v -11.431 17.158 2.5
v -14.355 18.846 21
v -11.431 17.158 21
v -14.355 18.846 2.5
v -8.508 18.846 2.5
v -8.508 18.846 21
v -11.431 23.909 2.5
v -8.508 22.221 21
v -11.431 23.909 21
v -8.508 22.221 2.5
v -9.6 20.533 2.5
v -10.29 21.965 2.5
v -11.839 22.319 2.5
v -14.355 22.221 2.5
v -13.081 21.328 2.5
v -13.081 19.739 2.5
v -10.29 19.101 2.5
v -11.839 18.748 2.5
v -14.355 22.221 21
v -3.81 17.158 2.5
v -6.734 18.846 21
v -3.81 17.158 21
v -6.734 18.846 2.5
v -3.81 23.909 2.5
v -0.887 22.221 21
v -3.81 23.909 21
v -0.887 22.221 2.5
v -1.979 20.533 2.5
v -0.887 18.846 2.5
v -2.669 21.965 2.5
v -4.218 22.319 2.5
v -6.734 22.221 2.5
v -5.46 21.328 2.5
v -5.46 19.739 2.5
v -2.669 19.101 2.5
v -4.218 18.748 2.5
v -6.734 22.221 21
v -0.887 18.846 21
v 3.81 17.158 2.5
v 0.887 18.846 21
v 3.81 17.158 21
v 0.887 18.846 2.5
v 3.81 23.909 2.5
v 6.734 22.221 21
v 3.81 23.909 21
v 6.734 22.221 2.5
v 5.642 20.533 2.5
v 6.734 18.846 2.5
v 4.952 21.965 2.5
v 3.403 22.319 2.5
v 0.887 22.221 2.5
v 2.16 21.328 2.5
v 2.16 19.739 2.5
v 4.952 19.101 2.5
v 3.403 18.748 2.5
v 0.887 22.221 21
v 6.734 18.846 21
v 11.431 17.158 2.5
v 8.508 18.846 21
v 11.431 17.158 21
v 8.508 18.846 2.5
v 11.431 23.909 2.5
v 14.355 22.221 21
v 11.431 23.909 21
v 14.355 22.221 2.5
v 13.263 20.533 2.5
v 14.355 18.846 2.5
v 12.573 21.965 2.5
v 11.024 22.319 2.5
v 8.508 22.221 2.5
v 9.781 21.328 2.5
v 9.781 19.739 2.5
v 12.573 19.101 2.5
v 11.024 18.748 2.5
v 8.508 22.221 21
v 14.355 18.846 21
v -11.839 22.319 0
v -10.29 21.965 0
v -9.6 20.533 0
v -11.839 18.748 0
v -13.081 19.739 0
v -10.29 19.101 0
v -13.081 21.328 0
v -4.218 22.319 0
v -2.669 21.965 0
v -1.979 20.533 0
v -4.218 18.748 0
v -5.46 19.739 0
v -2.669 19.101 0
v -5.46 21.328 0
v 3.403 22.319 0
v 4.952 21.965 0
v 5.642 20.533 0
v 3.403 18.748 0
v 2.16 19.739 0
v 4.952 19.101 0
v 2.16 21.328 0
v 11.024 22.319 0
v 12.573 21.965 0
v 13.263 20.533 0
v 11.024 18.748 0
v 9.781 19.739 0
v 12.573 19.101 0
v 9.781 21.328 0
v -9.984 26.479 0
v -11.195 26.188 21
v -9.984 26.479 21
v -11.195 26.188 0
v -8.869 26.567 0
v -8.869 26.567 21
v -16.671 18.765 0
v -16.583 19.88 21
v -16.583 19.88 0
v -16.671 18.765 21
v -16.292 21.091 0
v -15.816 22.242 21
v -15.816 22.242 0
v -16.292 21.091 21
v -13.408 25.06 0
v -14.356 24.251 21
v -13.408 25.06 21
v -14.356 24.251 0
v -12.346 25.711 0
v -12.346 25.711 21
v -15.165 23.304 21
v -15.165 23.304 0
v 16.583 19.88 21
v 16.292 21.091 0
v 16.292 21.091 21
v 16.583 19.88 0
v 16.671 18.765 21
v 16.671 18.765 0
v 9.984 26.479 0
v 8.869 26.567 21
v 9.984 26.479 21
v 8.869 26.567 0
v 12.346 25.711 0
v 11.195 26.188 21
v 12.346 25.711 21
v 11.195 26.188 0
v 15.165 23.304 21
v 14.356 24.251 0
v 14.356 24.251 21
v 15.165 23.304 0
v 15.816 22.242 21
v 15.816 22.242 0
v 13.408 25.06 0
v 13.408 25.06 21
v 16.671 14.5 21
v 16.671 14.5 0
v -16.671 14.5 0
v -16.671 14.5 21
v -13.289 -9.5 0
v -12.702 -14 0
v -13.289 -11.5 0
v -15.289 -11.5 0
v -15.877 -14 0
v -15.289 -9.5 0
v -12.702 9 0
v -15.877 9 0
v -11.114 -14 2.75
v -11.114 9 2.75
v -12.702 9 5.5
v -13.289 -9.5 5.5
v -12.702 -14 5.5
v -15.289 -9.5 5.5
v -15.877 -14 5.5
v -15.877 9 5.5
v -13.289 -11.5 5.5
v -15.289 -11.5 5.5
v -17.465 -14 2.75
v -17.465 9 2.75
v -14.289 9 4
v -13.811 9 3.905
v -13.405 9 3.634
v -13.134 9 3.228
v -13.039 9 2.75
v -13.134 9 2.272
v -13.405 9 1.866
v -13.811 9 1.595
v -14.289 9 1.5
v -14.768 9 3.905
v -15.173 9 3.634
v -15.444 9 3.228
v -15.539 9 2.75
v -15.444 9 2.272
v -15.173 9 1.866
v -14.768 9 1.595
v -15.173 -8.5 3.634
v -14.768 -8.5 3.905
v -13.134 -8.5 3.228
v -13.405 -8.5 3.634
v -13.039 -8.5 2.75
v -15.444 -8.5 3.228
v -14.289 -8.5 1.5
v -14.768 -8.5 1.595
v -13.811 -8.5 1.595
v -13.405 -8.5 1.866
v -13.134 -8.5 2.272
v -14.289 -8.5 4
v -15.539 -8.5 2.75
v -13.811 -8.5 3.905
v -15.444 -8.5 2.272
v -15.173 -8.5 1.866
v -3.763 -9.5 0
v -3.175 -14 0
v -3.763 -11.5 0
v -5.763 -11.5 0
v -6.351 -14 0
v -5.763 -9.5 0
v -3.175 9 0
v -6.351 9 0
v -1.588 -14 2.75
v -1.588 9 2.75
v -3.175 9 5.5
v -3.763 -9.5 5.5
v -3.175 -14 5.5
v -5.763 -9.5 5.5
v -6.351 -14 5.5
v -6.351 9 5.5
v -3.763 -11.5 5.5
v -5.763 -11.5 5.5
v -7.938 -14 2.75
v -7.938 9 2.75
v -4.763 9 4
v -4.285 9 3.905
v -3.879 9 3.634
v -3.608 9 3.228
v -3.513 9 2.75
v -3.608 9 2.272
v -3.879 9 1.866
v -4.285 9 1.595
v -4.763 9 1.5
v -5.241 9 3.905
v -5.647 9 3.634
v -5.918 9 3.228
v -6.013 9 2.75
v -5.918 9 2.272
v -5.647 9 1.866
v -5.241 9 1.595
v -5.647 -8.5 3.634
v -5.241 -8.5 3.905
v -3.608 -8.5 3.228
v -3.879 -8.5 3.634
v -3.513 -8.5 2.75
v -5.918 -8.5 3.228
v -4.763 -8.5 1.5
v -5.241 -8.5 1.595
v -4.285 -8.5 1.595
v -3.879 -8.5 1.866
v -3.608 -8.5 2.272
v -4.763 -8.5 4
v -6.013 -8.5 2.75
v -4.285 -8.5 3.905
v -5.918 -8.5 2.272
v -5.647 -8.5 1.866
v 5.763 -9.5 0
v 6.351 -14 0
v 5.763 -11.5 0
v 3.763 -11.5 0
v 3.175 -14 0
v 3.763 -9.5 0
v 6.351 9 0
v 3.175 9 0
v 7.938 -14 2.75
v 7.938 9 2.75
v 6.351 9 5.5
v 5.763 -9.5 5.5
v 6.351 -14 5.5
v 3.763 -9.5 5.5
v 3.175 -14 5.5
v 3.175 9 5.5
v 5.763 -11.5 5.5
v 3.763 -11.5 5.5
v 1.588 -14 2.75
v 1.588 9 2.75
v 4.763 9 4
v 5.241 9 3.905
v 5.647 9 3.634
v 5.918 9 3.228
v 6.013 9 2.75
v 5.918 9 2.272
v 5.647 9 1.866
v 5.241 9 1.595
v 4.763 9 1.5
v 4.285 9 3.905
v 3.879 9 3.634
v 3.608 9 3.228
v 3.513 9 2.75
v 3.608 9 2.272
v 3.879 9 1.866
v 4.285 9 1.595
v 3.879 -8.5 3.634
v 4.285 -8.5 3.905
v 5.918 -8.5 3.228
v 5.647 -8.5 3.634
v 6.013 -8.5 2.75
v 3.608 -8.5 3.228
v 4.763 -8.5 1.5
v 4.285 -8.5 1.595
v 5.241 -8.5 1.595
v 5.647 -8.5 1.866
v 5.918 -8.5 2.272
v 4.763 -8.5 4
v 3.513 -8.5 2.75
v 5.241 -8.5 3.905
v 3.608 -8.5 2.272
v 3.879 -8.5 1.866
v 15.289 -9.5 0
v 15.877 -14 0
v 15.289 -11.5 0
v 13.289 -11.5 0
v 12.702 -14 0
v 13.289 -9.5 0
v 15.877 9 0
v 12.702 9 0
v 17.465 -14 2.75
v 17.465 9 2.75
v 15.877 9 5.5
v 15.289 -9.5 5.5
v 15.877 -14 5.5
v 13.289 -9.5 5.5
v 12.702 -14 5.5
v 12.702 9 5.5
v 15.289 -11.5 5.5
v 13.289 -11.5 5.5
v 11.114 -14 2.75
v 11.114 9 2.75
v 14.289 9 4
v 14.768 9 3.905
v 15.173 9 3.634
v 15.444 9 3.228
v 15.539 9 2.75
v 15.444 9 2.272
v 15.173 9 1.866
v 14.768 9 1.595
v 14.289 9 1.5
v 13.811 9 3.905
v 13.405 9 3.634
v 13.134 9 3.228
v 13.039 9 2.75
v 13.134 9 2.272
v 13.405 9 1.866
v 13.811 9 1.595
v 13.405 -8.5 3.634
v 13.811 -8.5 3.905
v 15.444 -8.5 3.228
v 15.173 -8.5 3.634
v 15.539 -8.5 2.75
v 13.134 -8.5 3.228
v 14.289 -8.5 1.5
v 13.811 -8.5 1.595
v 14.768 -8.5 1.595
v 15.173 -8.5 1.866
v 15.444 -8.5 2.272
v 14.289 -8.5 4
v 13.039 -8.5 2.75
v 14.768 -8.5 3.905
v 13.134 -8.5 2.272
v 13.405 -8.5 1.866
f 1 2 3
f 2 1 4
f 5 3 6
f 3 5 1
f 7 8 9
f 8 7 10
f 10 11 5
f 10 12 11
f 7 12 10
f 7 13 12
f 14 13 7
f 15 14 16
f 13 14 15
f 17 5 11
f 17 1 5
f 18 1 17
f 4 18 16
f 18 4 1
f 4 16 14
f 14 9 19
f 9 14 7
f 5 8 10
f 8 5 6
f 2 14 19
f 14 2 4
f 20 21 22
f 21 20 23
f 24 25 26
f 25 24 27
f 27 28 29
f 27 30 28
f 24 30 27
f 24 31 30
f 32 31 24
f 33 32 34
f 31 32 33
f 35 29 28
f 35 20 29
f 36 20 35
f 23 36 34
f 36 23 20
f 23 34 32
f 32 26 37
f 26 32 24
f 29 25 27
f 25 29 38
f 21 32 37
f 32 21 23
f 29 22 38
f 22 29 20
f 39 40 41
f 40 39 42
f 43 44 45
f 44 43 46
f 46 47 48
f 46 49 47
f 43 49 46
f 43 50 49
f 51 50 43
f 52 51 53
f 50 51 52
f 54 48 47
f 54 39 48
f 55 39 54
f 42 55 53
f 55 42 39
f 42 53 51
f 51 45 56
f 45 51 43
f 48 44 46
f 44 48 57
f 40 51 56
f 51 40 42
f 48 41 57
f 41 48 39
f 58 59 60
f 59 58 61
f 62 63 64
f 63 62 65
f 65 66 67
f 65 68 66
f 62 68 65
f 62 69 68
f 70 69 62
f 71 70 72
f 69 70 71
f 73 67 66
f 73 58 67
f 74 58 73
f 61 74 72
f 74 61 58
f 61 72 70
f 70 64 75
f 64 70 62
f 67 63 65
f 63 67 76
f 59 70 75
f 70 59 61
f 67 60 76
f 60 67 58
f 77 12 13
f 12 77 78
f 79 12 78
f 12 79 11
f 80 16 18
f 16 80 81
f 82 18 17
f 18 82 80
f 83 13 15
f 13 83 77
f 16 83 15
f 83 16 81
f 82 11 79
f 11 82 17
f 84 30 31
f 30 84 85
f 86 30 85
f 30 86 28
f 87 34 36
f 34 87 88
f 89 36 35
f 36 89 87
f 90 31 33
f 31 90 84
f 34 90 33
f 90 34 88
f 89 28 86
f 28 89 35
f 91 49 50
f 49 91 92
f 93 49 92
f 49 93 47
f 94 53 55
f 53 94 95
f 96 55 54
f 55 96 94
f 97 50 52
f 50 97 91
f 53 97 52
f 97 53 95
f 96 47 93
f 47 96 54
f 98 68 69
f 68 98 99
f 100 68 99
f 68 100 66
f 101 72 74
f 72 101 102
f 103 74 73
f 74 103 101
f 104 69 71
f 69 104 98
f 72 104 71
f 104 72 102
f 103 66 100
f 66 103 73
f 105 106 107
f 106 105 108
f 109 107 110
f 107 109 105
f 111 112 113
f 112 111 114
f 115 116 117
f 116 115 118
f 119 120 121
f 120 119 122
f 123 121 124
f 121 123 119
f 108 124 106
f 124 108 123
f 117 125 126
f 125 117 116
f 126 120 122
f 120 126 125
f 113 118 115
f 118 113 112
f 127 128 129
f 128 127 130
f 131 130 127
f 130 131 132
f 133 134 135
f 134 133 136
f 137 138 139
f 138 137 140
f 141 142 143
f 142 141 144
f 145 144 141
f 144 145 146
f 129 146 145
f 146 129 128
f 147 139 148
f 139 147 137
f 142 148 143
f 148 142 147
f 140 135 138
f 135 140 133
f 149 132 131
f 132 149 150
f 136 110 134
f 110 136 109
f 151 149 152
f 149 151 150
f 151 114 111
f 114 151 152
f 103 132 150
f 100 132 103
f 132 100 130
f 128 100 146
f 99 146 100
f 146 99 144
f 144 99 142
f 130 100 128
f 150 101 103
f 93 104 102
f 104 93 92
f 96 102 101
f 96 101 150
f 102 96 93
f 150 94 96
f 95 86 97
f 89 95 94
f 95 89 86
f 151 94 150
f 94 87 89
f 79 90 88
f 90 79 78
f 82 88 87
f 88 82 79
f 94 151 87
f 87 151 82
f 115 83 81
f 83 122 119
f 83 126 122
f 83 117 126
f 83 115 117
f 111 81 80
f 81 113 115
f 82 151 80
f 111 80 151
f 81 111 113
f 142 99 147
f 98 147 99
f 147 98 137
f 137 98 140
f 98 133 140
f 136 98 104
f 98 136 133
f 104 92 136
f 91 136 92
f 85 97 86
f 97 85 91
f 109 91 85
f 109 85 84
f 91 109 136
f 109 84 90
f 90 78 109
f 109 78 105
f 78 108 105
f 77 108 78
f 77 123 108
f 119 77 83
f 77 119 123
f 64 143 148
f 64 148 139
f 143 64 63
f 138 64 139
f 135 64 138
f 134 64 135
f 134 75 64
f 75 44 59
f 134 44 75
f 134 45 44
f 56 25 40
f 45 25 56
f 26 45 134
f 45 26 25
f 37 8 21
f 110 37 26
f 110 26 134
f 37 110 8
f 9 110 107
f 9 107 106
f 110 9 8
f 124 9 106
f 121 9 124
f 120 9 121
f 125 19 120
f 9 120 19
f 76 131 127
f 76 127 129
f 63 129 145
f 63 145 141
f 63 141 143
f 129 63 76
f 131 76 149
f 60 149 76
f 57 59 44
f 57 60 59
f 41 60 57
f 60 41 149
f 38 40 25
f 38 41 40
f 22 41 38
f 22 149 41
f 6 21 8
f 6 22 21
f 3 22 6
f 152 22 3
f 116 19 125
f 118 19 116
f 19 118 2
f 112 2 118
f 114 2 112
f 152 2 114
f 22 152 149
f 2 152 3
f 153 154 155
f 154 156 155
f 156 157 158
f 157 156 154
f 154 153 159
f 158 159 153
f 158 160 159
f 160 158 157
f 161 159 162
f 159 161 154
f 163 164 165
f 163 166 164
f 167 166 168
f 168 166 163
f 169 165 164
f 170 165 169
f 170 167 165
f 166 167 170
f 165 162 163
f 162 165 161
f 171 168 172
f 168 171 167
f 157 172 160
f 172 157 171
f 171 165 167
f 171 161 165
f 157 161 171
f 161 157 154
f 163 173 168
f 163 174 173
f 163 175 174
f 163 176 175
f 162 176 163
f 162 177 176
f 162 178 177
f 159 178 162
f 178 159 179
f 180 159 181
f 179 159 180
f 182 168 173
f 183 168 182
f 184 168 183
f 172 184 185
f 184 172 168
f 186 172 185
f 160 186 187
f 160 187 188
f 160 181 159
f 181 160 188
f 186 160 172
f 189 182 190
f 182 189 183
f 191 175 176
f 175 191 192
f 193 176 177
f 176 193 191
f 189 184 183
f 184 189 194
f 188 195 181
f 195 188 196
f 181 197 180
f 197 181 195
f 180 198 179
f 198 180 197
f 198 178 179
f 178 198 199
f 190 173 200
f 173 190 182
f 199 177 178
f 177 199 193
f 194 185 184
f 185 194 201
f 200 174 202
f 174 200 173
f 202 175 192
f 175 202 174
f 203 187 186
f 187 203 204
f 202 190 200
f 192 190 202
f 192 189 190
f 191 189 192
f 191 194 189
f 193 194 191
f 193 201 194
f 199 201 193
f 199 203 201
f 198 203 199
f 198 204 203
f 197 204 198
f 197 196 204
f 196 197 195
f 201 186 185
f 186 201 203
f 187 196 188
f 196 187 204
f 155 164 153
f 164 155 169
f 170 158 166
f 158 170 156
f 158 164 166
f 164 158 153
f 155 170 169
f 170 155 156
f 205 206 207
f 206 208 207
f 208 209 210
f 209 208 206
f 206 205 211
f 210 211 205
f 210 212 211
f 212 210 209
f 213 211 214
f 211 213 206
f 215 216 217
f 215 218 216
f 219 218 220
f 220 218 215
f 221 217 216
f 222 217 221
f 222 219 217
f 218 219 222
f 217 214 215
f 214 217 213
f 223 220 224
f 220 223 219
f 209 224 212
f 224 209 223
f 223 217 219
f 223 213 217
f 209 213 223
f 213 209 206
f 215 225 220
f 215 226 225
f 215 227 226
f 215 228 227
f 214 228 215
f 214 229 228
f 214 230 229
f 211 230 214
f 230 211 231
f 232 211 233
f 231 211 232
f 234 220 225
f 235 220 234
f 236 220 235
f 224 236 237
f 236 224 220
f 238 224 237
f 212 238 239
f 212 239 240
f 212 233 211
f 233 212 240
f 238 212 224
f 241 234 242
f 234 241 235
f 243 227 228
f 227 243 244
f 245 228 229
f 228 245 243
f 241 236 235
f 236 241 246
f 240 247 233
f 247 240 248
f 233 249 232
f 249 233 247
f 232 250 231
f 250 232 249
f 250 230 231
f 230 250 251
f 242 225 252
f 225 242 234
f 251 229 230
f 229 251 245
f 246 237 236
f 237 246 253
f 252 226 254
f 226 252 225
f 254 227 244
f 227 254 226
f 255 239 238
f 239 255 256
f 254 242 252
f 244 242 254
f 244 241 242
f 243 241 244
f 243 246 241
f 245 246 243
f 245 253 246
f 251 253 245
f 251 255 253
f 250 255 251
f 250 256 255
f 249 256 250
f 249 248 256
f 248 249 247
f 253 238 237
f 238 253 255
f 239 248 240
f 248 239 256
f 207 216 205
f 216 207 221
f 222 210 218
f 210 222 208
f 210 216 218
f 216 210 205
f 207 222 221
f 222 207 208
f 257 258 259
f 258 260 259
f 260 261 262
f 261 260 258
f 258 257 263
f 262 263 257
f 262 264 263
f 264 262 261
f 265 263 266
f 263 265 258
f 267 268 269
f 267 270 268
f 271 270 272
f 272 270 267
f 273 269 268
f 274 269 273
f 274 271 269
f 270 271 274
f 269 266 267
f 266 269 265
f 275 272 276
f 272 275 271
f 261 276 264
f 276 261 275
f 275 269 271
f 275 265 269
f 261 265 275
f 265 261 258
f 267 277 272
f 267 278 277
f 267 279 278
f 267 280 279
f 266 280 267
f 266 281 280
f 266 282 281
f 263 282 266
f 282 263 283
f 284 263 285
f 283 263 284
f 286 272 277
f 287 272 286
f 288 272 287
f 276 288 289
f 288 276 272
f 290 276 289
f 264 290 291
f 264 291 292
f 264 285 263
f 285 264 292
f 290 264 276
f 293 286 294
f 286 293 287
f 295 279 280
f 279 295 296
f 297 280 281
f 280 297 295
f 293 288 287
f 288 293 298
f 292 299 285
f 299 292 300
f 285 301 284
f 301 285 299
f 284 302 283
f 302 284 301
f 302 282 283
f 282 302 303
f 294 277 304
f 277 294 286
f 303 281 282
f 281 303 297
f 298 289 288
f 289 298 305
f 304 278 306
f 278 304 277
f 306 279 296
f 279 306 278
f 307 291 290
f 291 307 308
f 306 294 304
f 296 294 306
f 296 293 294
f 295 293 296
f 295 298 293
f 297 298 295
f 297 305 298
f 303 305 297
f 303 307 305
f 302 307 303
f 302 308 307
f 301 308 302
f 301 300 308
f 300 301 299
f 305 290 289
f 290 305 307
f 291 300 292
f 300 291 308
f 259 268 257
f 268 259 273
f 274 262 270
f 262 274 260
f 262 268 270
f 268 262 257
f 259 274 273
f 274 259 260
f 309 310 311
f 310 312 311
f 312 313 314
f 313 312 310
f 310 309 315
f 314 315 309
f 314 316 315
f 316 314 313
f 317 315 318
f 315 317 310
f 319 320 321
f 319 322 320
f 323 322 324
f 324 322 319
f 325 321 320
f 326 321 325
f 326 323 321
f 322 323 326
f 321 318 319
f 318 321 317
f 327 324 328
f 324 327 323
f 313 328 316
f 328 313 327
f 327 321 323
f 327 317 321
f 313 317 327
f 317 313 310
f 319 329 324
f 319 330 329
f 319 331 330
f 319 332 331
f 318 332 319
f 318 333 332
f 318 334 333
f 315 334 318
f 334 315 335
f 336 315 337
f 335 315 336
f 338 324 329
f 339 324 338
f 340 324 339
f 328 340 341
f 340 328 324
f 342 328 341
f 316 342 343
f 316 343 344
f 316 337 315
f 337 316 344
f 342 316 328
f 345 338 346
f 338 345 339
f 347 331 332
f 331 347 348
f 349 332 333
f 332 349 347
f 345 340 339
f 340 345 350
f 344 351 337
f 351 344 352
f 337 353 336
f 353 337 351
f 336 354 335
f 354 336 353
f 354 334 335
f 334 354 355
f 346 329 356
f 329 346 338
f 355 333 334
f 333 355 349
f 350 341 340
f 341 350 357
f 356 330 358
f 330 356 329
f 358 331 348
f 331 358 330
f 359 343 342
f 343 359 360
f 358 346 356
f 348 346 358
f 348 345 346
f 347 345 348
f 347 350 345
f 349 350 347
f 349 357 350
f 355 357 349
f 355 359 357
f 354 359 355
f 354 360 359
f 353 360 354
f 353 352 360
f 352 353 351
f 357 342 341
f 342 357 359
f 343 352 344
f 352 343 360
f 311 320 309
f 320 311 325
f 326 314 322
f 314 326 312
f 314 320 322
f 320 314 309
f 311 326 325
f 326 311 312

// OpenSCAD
/*

Parametric Prosthetic Hand String Tensioner
Based on a part designed by Ivan Owen
Put into parametric format by David Orgeman

Released under the terms of the GNU GPL v3.0 

This program is free software: you can redistribute it and/or modify
it under the terms of the GNU General Public License as published by
the Free Software Foundation, either version 3 of the License, or
(at your option) any later version.

This program is distributed in the hope that it will be useful,
but WITHOUT ANY WARRANTY; without even the implied warranty of
MERCHANTABILITY or FITNESS FOR A PARTICULAR PURPOSE. See the
GNU General Public License for more details.

You should have received a copy of the GNU General Public License
along with this program. If not, see <http://www.gnu.org/licenses/>.

*/


Metric_Table=[ 	["M2", 0.8000, 1.1000, 2.3094], 
				["M2.5", 1.0250, 1.3750, 2.8868], 
				["M3", 1.2500, 1.6500, 3.1754], 
				["M4", 1.6500, 2.2000, 4.0415], 
				["M5", 2.1000, 2.7500, 4.6188]  ];


//Standard hole sizes for tapping into plastic
//M2T=1.60;
//M25T=2.05;
//M3T=2.5;
//M4T=3.3;
//M5T=4.2;

//Standard hole sizes for metric screws
//M2=2.2;
//M25=2.75;
//M3=3.3;
//M4=4.4;
//M5=5.5;

//Standard nut sizes - flat-to-flat and then as radius
//M2NutW=4.0;
//M25NutW=5.0;
//M3NutW=5.5;
//M4NutW=7.0;
//M5NutW=8.0;
//M2NutR=(M2NutW/cos(30))/2;
//M25NutR=(M25NutW/cos(30))/2;
//M3NutR=(M3NutW/cos(30))/2;
//M4NutR=(M4NutW/cos(30))/2;
//M5NutR=(M5NutW/cos(30))/2;


//PARAMETERS

//size of the tuner drive screws
Tuner_Size="M3";//[ M2, M2.5, M3, M4, M5 ]

Metric_Index=search([Tuner_Size], Metric_Table)[0];
Tuner_Screw_Radius=Metric_Table[Metric_Index][1];
Block_Screw_Radius=Metric_Table[Metric_Index][2];
Rod_Radius=Metric_Table[Metric_Index][3];

//functional length of the tuner rods
Rod_Length=18.0;

//extra tuner length to tie the string to
Extra_Length=5.0;

//radius of hole in tuner rod to hold the string
String_Radius=1.0;

//number of tuner rods and tuner slots in the block
Tuner_Count=4;//[1, 2, 3, 4, 5]

//extra gap in the tuner block slots to allow the rods to fit
Tuner_Fit=0.2;


//0 to print tuners, 1 to omit them
Print_Tuners=0;//[0, 1]

//0 to print the block, 1 to omit it
Print_Block=0;//[0, 1]


//RENDER
if (Print_Block == 0)
	{
	translate([0, Rod_Length/2+Extra_Length/2+3, 0])
		block();
	}
	

if (Print_Tuners == 0)
	{
	if (Tuner_Count>0)
		{
		for(i=[1:Tuner_Count])
			{
			translate([-3*Rod_Radius*(Tuner_Count+1)/2 + 3*Rod_Radius*i, 0, 0])
				tuner();
			}
		}
	}


module block()
	{
	rotate(a=[-90, 0, 0])
	translate([0, -(Rod_Length+3), 0])
	difference()
		{
		translate([-2.1*Rod_Radius*(Tuner_Count+1)/2, 0, 0])
			cube([4.2*Rod_Radius*(Tuner_Count+1)/2, Rod_Length+3, 3.8*Rod_Radius]);

		for(i=[1:Tuner_Count])
			{
			translate([-2.4*Rod_Radius*(Tuner_Count+1)/2 + 2.4*Rod_Radius*i, Rod_Length+0.5, 1.9*Rod_Radius])
				rotate(a=[0, 30, 0])
				rotate(a=[90, 0, 0])
					cylinder(h=Rod_Length+2, r=Rod_Radius+Tuner_Fit, $fn=6);
			}

		for(i=[1:Tuner_Count])
			{
			translate([-2.4*Rod_Radius*(Tuner_Count+1)/2 + 2.4*Rod_Radius*i, 0, 1.9*Rod_Radius])
				rotate(a=[90, 0, 0])
					polyhole(h=100, d=Block_Screw_Radius*2);
			}
		
		translate([-2.1*Rod_Radius*(Tuner_Count+1)/2-0.01, 0, 3.8*Rod_Radius+0.01])
			rotate(a=[-90, 0, 0])
				fillet(r=2.5*Rod_Radius, h=100);
		translate([2.1*Rod_Radius*(Tuner_Count+1)/2+0.01, 0, 3.8*Rod_Radius+0.01])
			rotate(a=[0, 90, 0])
			rotate(a=[-90, 0, 0])
				fillet(r=2.5*Rod_Radius, h=100);
		
		}	
	}	
	
	
module tuner()
	{
	translate([0, Rod_Length/2, Rod_Radius*cos(30)])
	difference()
		{
		rotate(a=[90, 0, 0])
			cylinder(h=Rod_Length+Extra_Length, r=Rod_Radius, $fn=6);
		translate([0, 1, 0])
			rotate(a=[90, 0, 0])
				cylinder(h=Rod_Length+1-0.5, r=Tuner_Screw_Radius, $fn=16);
		translate([-String_Radius, -Rod_Length-Extra_Length/2, -10])
//			polyhole(h=20, d=String_Radius*2);
//			cylinder(h=20, r=String_Radius, center=true);
			cube([2*String_Radius, 2*String_Radius, 20]);
		}
	}


module fillet(r, h) 
	{
	translate([r/2, r/2, 0])
		difference() 
			{
			cube([r, r, h], center=true);
			translate([r/2, r/2, 0])
				cylinder(h=h+1, r=r, center=true, $fn=40);
			}
	}


module fillet_bez(r, h, a=90) 
	{
	p0=[r, 0];
	p1=[0, 0];
	p2=[r*cos(a), r*sin(a)];
	translate([0, 0, -h/2])
		linear_extrude(height=h) BezConic(p0, p1, p2, 32);
	}
	
	
// By nophead
module polyhole(d, h) 
	{
	n=max(round(2*d), 3);
	rotate(v=[0, 0, 180])
		cylinder(h=h, r=(d/2)/cos(180/n), center=true, $fn=n);
	}


/* 
Conic Bezier Curve
also known as Quadratic Bezier Curve
also known as Bezier Curve with 3 control points 

Please see 
http://www.thingiverse.com/thing:8443 by William A Adams
http://en.wikipedia.org/wiki/File:Bezier_2_big.gif by Phil Tregoning
http://en.wikipedia.org/wiki/B%C3%A9zier_curve by Wikipedia editors

By Don B, 2011, released into the Public Domain
*/

module BezConic(p0, p1, p2, steps=5) {

	stepsize1 = (p1-p0)/steps;
	stepsize2 = (p2-p1)/steps;

	for (i=[0 : steps-1]) {
		assign(point1 = p0+stepsize1*i) 
		assign(point2 = p1+stepsize2*i) 
		assign(point3 = p0+stepsize1*(i+1))
		assign(point4 = p1+stepsize2*(i+1))  {
			assign( bpoint1 = point1+(point2-point1)*(i/steps) )
			assign( bpoint2 = point3+(point4-point3)*((i+1)/steps) ) {
				polygon(points=[bpoint1, bpoint2, p1]);
			}
		}
	}
}
